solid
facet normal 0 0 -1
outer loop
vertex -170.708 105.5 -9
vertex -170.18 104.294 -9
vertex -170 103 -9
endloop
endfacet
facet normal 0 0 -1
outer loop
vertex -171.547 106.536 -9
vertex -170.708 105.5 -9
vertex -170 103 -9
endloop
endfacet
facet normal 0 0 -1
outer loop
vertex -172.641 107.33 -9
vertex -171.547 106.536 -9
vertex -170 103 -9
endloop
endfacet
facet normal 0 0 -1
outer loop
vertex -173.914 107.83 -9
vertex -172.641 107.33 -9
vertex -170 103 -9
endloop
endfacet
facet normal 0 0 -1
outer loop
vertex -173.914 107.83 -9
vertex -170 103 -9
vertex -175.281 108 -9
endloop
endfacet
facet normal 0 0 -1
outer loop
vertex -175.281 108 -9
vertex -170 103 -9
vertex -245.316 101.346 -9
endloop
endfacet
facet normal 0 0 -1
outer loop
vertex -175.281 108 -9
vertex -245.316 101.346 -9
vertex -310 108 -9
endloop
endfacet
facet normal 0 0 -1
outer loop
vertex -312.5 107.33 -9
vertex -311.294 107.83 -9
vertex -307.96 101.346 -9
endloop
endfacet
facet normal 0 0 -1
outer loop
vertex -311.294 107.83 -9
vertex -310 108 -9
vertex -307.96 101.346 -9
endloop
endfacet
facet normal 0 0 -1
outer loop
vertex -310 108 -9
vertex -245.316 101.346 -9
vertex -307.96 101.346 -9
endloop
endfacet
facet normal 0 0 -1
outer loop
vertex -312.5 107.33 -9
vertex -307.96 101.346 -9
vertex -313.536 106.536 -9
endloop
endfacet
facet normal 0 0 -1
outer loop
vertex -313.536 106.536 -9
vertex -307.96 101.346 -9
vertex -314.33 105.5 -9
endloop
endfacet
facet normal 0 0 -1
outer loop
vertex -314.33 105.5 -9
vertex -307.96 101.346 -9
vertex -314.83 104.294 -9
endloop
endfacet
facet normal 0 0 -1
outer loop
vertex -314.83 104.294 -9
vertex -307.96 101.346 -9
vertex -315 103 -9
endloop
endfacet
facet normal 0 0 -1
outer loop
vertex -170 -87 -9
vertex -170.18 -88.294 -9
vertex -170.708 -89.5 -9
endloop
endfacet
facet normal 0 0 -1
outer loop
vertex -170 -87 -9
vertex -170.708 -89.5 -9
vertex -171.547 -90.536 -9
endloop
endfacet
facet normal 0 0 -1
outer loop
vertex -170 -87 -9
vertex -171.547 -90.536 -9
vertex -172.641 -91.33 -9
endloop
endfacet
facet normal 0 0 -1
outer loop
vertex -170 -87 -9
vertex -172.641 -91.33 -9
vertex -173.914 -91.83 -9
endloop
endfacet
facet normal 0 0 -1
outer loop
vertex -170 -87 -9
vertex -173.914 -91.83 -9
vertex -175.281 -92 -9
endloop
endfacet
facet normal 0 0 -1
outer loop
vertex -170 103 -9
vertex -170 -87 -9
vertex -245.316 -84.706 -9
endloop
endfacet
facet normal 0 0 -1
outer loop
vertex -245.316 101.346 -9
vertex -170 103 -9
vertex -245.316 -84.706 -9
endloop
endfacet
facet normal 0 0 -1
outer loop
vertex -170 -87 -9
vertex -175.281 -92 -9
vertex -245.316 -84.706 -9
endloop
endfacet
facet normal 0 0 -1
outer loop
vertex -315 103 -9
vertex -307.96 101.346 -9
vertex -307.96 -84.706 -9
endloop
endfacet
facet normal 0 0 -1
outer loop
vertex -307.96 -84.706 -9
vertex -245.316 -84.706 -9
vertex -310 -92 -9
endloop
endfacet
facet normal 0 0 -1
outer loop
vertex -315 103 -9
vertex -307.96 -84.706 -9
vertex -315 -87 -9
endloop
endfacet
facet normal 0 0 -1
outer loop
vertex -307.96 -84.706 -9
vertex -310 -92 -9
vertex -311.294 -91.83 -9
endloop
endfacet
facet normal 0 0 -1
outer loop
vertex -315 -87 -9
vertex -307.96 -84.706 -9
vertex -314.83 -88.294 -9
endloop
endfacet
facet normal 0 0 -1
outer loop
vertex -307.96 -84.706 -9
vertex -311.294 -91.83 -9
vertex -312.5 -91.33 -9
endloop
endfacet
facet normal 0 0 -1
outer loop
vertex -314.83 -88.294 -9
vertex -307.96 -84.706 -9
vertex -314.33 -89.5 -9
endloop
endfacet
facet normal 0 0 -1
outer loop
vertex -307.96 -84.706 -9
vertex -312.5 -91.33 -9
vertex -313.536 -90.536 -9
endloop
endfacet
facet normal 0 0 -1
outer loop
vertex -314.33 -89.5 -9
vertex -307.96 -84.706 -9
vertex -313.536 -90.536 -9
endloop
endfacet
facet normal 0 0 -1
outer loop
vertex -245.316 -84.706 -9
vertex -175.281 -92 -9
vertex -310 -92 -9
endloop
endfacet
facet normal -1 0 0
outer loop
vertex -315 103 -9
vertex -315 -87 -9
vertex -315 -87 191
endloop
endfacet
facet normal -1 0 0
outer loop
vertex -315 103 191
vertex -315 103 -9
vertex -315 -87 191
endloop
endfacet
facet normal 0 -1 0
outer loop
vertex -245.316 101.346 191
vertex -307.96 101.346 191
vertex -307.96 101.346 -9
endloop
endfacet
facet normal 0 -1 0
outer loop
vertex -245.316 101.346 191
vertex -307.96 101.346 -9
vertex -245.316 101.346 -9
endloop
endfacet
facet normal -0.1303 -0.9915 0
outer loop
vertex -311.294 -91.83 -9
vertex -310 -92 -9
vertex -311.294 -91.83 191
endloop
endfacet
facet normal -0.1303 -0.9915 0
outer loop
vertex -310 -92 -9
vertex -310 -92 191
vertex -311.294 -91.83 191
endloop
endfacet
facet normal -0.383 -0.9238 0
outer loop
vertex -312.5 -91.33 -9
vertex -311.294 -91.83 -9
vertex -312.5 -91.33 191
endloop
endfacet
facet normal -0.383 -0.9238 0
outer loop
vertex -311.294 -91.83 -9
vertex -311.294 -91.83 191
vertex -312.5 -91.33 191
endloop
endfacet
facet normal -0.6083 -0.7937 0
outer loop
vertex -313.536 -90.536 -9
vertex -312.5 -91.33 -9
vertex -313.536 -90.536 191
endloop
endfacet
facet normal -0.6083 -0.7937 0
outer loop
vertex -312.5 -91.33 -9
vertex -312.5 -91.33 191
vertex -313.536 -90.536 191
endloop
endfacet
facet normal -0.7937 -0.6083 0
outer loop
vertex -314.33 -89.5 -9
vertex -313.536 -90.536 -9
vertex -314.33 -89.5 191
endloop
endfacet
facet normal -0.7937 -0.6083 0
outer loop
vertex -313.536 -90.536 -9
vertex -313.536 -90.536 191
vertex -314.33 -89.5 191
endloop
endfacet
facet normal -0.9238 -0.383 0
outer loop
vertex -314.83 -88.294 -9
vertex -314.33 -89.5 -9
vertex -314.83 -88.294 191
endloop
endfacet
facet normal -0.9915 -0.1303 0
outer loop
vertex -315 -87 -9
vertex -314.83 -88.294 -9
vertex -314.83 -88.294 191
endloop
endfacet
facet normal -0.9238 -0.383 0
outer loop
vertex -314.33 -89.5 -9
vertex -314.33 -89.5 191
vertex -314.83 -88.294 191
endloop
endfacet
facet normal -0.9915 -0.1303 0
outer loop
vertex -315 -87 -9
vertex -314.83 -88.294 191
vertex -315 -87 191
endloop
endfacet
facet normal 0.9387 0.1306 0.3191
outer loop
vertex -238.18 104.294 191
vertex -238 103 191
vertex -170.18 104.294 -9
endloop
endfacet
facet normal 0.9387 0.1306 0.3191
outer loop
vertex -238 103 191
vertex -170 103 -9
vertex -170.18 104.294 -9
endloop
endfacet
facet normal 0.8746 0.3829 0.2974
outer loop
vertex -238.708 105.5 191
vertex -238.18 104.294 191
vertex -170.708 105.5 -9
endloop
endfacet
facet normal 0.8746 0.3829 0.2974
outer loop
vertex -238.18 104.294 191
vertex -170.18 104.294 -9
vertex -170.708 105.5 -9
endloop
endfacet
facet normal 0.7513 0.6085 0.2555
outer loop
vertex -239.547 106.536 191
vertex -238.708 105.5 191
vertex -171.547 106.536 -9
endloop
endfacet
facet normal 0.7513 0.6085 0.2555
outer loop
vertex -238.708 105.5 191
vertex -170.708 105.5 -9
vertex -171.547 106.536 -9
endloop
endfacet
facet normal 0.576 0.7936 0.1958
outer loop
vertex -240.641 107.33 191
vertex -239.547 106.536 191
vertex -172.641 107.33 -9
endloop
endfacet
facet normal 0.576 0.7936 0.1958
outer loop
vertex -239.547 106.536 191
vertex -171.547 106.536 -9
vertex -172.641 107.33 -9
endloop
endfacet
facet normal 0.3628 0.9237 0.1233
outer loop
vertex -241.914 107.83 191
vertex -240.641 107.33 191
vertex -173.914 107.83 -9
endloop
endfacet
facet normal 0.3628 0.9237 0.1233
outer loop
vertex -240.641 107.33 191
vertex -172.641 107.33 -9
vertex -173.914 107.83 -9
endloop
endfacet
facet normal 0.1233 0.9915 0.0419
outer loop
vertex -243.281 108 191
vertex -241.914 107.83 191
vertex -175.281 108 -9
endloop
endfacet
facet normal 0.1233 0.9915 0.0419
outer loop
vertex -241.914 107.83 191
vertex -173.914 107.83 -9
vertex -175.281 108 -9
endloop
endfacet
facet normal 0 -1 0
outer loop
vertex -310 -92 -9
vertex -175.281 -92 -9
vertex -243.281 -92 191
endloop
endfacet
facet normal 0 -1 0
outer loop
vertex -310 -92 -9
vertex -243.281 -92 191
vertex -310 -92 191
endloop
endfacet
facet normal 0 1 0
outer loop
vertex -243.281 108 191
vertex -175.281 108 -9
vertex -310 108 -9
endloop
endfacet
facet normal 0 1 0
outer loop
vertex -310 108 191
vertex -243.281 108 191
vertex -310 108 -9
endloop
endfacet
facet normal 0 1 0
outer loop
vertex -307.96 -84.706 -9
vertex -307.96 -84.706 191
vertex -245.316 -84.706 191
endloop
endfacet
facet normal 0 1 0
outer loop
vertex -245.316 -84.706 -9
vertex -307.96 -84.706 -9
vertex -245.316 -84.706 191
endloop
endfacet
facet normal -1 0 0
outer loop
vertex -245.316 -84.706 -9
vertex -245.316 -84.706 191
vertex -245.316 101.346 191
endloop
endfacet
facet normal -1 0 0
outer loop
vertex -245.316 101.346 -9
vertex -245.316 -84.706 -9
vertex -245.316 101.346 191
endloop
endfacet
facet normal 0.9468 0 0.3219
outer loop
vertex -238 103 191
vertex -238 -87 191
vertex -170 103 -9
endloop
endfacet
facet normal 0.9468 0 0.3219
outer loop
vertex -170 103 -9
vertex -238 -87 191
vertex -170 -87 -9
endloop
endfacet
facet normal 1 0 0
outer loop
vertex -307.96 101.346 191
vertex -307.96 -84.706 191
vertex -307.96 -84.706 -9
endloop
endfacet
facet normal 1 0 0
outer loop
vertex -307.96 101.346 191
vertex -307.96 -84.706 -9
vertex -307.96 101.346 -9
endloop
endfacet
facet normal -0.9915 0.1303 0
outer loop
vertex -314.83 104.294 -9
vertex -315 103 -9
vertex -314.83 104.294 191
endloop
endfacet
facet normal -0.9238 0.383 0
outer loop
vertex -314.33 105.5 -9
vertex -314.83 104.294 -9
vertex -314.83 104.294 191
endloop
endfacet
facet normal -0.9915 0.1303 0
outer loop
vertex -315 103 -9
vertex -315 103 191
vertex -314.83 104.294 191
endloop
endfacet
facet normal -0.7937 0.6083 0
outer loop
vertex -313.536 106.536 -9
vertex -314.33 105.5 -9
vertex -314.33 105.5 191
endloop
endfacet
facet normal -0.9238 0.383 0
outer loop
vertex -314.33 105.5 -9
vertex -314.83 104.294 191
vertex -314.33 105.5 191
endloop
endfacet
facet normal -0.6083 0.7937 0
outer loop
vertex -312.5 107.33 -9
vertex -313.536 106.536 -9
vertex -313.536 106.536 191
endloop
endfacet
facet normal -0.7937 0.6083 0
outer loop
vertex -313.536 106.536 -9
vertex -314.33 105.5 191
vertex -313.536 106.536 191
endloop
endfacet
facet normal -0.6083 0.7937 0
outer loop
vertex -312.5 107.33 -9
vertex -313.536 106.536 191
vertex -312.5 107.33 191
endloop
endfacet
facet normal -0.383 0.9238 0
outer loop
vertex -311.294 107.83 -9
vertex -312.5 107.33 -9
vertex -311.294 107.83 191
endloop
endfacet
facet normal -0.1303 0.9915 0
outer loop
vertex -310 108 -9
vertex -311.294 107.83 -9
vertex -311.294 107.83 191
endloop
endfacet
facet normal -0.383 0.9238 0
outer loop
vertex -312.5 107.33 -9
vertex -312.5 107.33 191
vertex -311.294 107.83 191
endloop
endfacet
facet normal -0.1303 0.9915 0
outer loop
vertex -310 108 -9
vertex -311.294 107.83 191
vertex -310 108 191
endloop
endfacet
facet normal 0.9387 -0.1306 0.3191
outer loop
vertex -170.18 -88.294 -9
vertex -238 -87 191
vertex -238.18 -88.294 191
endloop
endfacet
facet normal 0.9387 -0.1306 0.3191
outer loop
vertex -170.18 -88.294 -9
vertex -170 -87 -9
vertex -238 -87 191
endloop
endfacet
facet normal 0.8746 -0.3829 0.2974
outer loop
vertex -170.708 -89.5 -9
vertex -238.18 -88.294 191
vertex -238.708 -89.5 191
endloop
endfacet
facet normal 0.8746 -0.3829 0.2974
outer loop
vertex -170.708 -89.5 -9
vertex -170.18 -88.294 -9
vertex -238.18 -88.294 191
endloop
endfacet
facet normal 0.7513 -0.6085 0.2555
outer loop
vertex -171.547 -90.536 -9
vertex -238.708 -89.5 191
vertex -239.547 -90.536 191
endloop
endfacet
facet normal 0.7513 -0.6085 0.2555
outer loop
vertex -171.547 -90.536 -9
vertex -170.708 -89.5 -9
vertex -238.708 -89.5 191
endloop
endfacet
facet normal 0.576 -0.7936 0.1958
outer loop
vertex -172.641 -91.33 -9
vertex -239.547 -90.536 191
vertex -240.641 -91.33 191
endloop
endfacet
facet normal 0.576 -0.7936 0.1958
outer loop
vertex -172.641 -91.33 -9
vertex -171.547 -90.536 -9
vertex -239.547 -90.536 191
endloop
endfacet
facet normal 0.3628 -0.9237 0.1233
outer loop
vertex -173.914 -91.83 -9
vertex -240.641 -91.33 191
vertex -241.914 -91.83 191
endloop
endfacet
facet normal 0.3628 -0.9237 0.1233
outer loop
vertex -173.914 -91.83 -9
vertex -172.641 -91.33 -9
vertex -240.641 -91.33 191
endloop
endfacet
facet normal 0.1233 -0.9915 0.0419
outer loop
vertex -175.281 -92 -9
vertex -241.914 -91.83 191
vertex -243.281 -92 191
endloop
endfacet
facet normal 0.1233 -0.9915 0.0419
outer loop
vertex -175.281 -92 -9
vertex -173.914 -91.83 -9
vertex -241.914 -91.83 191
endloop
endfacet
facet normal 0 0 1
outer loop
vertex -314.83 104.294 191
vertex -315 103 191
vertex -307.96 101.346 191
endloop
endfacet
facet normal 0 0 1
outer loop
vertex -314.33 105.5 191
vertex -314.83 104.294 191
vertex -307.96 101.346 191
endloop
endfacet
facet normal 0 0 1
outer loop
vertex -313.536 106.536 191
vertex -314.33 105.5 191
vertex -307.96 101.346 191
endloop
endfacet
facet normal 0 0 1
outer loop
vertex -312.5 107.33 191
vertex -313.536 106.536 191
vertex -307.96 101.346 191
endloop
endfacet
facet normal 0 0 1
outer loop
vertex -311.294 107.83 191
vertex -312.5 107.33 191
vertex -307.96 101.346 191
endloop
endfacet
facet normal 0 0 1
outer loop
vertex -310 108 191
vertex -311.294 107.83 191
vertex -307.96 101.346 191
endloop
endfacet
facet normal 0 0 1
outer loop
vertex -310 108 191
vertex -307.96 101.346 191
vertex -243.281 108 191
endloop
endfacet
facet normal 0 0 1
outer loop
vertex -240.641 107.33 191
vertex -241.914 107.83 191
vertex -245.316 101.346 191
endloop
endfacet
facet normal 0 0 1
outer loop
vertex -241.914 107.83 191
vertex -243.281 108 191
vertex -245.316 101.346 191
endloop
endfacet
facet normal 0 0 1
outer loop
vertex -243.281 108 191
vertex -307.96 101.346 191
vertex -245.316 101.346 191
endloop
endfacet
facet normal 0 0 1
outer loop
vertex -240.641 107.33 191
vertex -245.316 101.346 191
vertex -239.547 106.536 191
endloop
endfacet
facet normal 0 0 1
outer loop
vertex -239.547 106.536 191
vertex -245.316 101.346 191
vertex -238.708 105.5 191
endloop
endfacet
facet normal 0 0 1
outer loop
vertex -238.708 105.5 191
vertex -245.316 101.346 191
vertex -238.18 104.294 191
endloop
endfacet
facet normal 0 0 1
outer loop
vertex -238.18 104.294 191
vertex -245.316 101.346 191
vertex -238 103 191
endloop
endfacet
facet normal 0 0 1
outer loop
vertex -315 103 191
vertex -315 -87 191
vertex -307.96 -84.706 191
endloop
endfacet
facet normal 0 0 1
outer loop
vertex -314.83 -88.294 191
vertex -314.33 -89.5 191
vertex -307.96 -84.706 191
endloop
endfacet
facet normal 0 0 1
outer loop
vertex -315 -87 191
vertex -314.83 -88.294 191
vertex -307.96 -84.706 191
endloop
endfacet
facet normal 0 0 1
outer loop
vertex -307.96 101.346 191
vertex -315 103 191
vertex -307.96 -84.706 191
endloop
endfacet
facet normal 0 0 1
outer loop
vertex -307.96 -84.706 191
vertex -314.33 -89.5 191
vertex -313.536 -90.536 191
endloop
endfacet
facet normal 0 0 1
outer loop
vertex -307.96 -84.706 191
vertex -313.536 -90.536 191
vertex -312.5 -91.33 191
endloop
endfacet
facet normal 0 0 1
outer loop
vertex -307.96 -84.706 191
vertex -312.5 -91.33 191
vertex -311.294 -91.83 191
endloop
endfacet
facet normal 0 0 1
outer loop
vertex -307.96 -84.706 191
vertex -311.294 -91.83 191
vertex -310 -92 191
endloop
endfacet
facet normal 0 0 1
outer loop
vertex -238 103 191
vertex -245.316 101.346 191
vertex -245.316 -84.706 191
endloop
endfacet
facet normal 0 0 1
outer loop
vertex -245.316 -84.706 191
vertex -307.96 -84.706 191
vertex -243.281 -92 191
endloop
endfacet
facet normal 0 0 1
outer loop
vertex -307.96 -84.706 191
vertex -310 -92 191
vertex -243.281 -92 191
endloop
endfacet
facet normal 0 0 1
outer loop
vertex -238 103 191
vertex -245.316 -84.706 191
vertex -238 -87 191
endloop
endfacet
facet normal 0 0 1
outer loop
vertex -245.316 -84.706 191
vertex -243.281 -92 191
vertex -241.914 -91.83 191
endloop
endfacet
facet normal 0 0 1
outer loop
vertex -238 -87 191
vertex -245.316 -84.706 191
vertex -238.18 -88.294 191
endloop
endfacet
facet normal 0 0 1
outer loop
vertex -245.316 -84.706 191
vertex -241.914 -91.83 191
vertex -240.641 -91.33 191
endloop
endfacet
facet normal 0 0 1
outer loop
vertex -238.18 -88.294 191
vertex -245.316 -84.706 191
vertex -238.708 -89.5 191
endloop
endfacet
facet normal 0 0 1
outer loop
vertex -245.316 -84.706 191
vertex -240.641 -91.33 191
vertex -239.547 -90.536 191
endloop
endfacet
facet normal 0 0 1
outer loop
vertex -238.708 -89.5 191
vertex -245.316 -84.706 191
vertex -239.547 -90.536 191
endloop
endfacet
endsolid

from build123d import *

# Parameters (mm, degrees)
PAD010_DEPTH            = 200
FILLET035_R             = 5
FILLET034_R             = 5
FILLET036_R             = 5
SKETCH016_W             = 62.643768
SKETCH016_H             = 186.051987
POCKET_DEPTH            = 200
BODY006_ROLL_ANGLE      = 90
BODY006_PLACEMENT_ANGLE = 180


with BuildPart() as part:
    # Sketch017 → Pad010 (new body)
    with BuildSketch(Plane.XY):
        Polygon((0, 0), (145, 0), (145, 200), (68, 200), align=None)
    extrude(amount=PAD010_DEPTH)

    # Fillet035
    fillet035_edges = [part.edges().sort_by_distance(p)[0] for p in [
        (34, 100, 0),
        (34, 100, 200),
    ]]
    fillet(fillet035_edges, radius=FILLET035_R)

    # Fillet034
    fillet034_edges = [part.edges().sort_by_distance(p)[0] for p in [
        (145, 100, 0),
    ]]
    fillet(fillet034_edges, radius=FILLET034_R)

    # Fillet036
    fillet036_edges = [part.edges().sort_by_distance(p)[0] for p in [
        (145, 100, 200),
    ]]
    fillet(fillet036_edges, radius=FILLET036_R)

    # Sketch016 (on Face10 of Fillet036) → Pocket (cut)
    with BuildSketch(Plane(origin=(0, 200, 0), x_dir=(-1, 0, 0), z_dir=(0, 1, 0))):
        with Locations((-106.638336, 100.319633)):
            Rectangle(SKETCH016_W, SKETCH016_H)
    extrude(amount=-POCKET_DEPTH, mode=Mode.SUBTRACT)


with BuildPart() as part_1:
    # Body006 roll: moved
    add(part.part.rotate(Axis((0, 0, 0), (1, 0, 0)), BODY006_ROLL_ANGLE))


with BuildPart() as part_2:
    # Body006 placement: moved
    add(part_1.part.moved(Location((-170, -92, -9))).rotate(Axis((-170, -92, -9), (0, 0, 1)), BODY006_PLACEMENT_ANGLE))


solid = part_2.part
